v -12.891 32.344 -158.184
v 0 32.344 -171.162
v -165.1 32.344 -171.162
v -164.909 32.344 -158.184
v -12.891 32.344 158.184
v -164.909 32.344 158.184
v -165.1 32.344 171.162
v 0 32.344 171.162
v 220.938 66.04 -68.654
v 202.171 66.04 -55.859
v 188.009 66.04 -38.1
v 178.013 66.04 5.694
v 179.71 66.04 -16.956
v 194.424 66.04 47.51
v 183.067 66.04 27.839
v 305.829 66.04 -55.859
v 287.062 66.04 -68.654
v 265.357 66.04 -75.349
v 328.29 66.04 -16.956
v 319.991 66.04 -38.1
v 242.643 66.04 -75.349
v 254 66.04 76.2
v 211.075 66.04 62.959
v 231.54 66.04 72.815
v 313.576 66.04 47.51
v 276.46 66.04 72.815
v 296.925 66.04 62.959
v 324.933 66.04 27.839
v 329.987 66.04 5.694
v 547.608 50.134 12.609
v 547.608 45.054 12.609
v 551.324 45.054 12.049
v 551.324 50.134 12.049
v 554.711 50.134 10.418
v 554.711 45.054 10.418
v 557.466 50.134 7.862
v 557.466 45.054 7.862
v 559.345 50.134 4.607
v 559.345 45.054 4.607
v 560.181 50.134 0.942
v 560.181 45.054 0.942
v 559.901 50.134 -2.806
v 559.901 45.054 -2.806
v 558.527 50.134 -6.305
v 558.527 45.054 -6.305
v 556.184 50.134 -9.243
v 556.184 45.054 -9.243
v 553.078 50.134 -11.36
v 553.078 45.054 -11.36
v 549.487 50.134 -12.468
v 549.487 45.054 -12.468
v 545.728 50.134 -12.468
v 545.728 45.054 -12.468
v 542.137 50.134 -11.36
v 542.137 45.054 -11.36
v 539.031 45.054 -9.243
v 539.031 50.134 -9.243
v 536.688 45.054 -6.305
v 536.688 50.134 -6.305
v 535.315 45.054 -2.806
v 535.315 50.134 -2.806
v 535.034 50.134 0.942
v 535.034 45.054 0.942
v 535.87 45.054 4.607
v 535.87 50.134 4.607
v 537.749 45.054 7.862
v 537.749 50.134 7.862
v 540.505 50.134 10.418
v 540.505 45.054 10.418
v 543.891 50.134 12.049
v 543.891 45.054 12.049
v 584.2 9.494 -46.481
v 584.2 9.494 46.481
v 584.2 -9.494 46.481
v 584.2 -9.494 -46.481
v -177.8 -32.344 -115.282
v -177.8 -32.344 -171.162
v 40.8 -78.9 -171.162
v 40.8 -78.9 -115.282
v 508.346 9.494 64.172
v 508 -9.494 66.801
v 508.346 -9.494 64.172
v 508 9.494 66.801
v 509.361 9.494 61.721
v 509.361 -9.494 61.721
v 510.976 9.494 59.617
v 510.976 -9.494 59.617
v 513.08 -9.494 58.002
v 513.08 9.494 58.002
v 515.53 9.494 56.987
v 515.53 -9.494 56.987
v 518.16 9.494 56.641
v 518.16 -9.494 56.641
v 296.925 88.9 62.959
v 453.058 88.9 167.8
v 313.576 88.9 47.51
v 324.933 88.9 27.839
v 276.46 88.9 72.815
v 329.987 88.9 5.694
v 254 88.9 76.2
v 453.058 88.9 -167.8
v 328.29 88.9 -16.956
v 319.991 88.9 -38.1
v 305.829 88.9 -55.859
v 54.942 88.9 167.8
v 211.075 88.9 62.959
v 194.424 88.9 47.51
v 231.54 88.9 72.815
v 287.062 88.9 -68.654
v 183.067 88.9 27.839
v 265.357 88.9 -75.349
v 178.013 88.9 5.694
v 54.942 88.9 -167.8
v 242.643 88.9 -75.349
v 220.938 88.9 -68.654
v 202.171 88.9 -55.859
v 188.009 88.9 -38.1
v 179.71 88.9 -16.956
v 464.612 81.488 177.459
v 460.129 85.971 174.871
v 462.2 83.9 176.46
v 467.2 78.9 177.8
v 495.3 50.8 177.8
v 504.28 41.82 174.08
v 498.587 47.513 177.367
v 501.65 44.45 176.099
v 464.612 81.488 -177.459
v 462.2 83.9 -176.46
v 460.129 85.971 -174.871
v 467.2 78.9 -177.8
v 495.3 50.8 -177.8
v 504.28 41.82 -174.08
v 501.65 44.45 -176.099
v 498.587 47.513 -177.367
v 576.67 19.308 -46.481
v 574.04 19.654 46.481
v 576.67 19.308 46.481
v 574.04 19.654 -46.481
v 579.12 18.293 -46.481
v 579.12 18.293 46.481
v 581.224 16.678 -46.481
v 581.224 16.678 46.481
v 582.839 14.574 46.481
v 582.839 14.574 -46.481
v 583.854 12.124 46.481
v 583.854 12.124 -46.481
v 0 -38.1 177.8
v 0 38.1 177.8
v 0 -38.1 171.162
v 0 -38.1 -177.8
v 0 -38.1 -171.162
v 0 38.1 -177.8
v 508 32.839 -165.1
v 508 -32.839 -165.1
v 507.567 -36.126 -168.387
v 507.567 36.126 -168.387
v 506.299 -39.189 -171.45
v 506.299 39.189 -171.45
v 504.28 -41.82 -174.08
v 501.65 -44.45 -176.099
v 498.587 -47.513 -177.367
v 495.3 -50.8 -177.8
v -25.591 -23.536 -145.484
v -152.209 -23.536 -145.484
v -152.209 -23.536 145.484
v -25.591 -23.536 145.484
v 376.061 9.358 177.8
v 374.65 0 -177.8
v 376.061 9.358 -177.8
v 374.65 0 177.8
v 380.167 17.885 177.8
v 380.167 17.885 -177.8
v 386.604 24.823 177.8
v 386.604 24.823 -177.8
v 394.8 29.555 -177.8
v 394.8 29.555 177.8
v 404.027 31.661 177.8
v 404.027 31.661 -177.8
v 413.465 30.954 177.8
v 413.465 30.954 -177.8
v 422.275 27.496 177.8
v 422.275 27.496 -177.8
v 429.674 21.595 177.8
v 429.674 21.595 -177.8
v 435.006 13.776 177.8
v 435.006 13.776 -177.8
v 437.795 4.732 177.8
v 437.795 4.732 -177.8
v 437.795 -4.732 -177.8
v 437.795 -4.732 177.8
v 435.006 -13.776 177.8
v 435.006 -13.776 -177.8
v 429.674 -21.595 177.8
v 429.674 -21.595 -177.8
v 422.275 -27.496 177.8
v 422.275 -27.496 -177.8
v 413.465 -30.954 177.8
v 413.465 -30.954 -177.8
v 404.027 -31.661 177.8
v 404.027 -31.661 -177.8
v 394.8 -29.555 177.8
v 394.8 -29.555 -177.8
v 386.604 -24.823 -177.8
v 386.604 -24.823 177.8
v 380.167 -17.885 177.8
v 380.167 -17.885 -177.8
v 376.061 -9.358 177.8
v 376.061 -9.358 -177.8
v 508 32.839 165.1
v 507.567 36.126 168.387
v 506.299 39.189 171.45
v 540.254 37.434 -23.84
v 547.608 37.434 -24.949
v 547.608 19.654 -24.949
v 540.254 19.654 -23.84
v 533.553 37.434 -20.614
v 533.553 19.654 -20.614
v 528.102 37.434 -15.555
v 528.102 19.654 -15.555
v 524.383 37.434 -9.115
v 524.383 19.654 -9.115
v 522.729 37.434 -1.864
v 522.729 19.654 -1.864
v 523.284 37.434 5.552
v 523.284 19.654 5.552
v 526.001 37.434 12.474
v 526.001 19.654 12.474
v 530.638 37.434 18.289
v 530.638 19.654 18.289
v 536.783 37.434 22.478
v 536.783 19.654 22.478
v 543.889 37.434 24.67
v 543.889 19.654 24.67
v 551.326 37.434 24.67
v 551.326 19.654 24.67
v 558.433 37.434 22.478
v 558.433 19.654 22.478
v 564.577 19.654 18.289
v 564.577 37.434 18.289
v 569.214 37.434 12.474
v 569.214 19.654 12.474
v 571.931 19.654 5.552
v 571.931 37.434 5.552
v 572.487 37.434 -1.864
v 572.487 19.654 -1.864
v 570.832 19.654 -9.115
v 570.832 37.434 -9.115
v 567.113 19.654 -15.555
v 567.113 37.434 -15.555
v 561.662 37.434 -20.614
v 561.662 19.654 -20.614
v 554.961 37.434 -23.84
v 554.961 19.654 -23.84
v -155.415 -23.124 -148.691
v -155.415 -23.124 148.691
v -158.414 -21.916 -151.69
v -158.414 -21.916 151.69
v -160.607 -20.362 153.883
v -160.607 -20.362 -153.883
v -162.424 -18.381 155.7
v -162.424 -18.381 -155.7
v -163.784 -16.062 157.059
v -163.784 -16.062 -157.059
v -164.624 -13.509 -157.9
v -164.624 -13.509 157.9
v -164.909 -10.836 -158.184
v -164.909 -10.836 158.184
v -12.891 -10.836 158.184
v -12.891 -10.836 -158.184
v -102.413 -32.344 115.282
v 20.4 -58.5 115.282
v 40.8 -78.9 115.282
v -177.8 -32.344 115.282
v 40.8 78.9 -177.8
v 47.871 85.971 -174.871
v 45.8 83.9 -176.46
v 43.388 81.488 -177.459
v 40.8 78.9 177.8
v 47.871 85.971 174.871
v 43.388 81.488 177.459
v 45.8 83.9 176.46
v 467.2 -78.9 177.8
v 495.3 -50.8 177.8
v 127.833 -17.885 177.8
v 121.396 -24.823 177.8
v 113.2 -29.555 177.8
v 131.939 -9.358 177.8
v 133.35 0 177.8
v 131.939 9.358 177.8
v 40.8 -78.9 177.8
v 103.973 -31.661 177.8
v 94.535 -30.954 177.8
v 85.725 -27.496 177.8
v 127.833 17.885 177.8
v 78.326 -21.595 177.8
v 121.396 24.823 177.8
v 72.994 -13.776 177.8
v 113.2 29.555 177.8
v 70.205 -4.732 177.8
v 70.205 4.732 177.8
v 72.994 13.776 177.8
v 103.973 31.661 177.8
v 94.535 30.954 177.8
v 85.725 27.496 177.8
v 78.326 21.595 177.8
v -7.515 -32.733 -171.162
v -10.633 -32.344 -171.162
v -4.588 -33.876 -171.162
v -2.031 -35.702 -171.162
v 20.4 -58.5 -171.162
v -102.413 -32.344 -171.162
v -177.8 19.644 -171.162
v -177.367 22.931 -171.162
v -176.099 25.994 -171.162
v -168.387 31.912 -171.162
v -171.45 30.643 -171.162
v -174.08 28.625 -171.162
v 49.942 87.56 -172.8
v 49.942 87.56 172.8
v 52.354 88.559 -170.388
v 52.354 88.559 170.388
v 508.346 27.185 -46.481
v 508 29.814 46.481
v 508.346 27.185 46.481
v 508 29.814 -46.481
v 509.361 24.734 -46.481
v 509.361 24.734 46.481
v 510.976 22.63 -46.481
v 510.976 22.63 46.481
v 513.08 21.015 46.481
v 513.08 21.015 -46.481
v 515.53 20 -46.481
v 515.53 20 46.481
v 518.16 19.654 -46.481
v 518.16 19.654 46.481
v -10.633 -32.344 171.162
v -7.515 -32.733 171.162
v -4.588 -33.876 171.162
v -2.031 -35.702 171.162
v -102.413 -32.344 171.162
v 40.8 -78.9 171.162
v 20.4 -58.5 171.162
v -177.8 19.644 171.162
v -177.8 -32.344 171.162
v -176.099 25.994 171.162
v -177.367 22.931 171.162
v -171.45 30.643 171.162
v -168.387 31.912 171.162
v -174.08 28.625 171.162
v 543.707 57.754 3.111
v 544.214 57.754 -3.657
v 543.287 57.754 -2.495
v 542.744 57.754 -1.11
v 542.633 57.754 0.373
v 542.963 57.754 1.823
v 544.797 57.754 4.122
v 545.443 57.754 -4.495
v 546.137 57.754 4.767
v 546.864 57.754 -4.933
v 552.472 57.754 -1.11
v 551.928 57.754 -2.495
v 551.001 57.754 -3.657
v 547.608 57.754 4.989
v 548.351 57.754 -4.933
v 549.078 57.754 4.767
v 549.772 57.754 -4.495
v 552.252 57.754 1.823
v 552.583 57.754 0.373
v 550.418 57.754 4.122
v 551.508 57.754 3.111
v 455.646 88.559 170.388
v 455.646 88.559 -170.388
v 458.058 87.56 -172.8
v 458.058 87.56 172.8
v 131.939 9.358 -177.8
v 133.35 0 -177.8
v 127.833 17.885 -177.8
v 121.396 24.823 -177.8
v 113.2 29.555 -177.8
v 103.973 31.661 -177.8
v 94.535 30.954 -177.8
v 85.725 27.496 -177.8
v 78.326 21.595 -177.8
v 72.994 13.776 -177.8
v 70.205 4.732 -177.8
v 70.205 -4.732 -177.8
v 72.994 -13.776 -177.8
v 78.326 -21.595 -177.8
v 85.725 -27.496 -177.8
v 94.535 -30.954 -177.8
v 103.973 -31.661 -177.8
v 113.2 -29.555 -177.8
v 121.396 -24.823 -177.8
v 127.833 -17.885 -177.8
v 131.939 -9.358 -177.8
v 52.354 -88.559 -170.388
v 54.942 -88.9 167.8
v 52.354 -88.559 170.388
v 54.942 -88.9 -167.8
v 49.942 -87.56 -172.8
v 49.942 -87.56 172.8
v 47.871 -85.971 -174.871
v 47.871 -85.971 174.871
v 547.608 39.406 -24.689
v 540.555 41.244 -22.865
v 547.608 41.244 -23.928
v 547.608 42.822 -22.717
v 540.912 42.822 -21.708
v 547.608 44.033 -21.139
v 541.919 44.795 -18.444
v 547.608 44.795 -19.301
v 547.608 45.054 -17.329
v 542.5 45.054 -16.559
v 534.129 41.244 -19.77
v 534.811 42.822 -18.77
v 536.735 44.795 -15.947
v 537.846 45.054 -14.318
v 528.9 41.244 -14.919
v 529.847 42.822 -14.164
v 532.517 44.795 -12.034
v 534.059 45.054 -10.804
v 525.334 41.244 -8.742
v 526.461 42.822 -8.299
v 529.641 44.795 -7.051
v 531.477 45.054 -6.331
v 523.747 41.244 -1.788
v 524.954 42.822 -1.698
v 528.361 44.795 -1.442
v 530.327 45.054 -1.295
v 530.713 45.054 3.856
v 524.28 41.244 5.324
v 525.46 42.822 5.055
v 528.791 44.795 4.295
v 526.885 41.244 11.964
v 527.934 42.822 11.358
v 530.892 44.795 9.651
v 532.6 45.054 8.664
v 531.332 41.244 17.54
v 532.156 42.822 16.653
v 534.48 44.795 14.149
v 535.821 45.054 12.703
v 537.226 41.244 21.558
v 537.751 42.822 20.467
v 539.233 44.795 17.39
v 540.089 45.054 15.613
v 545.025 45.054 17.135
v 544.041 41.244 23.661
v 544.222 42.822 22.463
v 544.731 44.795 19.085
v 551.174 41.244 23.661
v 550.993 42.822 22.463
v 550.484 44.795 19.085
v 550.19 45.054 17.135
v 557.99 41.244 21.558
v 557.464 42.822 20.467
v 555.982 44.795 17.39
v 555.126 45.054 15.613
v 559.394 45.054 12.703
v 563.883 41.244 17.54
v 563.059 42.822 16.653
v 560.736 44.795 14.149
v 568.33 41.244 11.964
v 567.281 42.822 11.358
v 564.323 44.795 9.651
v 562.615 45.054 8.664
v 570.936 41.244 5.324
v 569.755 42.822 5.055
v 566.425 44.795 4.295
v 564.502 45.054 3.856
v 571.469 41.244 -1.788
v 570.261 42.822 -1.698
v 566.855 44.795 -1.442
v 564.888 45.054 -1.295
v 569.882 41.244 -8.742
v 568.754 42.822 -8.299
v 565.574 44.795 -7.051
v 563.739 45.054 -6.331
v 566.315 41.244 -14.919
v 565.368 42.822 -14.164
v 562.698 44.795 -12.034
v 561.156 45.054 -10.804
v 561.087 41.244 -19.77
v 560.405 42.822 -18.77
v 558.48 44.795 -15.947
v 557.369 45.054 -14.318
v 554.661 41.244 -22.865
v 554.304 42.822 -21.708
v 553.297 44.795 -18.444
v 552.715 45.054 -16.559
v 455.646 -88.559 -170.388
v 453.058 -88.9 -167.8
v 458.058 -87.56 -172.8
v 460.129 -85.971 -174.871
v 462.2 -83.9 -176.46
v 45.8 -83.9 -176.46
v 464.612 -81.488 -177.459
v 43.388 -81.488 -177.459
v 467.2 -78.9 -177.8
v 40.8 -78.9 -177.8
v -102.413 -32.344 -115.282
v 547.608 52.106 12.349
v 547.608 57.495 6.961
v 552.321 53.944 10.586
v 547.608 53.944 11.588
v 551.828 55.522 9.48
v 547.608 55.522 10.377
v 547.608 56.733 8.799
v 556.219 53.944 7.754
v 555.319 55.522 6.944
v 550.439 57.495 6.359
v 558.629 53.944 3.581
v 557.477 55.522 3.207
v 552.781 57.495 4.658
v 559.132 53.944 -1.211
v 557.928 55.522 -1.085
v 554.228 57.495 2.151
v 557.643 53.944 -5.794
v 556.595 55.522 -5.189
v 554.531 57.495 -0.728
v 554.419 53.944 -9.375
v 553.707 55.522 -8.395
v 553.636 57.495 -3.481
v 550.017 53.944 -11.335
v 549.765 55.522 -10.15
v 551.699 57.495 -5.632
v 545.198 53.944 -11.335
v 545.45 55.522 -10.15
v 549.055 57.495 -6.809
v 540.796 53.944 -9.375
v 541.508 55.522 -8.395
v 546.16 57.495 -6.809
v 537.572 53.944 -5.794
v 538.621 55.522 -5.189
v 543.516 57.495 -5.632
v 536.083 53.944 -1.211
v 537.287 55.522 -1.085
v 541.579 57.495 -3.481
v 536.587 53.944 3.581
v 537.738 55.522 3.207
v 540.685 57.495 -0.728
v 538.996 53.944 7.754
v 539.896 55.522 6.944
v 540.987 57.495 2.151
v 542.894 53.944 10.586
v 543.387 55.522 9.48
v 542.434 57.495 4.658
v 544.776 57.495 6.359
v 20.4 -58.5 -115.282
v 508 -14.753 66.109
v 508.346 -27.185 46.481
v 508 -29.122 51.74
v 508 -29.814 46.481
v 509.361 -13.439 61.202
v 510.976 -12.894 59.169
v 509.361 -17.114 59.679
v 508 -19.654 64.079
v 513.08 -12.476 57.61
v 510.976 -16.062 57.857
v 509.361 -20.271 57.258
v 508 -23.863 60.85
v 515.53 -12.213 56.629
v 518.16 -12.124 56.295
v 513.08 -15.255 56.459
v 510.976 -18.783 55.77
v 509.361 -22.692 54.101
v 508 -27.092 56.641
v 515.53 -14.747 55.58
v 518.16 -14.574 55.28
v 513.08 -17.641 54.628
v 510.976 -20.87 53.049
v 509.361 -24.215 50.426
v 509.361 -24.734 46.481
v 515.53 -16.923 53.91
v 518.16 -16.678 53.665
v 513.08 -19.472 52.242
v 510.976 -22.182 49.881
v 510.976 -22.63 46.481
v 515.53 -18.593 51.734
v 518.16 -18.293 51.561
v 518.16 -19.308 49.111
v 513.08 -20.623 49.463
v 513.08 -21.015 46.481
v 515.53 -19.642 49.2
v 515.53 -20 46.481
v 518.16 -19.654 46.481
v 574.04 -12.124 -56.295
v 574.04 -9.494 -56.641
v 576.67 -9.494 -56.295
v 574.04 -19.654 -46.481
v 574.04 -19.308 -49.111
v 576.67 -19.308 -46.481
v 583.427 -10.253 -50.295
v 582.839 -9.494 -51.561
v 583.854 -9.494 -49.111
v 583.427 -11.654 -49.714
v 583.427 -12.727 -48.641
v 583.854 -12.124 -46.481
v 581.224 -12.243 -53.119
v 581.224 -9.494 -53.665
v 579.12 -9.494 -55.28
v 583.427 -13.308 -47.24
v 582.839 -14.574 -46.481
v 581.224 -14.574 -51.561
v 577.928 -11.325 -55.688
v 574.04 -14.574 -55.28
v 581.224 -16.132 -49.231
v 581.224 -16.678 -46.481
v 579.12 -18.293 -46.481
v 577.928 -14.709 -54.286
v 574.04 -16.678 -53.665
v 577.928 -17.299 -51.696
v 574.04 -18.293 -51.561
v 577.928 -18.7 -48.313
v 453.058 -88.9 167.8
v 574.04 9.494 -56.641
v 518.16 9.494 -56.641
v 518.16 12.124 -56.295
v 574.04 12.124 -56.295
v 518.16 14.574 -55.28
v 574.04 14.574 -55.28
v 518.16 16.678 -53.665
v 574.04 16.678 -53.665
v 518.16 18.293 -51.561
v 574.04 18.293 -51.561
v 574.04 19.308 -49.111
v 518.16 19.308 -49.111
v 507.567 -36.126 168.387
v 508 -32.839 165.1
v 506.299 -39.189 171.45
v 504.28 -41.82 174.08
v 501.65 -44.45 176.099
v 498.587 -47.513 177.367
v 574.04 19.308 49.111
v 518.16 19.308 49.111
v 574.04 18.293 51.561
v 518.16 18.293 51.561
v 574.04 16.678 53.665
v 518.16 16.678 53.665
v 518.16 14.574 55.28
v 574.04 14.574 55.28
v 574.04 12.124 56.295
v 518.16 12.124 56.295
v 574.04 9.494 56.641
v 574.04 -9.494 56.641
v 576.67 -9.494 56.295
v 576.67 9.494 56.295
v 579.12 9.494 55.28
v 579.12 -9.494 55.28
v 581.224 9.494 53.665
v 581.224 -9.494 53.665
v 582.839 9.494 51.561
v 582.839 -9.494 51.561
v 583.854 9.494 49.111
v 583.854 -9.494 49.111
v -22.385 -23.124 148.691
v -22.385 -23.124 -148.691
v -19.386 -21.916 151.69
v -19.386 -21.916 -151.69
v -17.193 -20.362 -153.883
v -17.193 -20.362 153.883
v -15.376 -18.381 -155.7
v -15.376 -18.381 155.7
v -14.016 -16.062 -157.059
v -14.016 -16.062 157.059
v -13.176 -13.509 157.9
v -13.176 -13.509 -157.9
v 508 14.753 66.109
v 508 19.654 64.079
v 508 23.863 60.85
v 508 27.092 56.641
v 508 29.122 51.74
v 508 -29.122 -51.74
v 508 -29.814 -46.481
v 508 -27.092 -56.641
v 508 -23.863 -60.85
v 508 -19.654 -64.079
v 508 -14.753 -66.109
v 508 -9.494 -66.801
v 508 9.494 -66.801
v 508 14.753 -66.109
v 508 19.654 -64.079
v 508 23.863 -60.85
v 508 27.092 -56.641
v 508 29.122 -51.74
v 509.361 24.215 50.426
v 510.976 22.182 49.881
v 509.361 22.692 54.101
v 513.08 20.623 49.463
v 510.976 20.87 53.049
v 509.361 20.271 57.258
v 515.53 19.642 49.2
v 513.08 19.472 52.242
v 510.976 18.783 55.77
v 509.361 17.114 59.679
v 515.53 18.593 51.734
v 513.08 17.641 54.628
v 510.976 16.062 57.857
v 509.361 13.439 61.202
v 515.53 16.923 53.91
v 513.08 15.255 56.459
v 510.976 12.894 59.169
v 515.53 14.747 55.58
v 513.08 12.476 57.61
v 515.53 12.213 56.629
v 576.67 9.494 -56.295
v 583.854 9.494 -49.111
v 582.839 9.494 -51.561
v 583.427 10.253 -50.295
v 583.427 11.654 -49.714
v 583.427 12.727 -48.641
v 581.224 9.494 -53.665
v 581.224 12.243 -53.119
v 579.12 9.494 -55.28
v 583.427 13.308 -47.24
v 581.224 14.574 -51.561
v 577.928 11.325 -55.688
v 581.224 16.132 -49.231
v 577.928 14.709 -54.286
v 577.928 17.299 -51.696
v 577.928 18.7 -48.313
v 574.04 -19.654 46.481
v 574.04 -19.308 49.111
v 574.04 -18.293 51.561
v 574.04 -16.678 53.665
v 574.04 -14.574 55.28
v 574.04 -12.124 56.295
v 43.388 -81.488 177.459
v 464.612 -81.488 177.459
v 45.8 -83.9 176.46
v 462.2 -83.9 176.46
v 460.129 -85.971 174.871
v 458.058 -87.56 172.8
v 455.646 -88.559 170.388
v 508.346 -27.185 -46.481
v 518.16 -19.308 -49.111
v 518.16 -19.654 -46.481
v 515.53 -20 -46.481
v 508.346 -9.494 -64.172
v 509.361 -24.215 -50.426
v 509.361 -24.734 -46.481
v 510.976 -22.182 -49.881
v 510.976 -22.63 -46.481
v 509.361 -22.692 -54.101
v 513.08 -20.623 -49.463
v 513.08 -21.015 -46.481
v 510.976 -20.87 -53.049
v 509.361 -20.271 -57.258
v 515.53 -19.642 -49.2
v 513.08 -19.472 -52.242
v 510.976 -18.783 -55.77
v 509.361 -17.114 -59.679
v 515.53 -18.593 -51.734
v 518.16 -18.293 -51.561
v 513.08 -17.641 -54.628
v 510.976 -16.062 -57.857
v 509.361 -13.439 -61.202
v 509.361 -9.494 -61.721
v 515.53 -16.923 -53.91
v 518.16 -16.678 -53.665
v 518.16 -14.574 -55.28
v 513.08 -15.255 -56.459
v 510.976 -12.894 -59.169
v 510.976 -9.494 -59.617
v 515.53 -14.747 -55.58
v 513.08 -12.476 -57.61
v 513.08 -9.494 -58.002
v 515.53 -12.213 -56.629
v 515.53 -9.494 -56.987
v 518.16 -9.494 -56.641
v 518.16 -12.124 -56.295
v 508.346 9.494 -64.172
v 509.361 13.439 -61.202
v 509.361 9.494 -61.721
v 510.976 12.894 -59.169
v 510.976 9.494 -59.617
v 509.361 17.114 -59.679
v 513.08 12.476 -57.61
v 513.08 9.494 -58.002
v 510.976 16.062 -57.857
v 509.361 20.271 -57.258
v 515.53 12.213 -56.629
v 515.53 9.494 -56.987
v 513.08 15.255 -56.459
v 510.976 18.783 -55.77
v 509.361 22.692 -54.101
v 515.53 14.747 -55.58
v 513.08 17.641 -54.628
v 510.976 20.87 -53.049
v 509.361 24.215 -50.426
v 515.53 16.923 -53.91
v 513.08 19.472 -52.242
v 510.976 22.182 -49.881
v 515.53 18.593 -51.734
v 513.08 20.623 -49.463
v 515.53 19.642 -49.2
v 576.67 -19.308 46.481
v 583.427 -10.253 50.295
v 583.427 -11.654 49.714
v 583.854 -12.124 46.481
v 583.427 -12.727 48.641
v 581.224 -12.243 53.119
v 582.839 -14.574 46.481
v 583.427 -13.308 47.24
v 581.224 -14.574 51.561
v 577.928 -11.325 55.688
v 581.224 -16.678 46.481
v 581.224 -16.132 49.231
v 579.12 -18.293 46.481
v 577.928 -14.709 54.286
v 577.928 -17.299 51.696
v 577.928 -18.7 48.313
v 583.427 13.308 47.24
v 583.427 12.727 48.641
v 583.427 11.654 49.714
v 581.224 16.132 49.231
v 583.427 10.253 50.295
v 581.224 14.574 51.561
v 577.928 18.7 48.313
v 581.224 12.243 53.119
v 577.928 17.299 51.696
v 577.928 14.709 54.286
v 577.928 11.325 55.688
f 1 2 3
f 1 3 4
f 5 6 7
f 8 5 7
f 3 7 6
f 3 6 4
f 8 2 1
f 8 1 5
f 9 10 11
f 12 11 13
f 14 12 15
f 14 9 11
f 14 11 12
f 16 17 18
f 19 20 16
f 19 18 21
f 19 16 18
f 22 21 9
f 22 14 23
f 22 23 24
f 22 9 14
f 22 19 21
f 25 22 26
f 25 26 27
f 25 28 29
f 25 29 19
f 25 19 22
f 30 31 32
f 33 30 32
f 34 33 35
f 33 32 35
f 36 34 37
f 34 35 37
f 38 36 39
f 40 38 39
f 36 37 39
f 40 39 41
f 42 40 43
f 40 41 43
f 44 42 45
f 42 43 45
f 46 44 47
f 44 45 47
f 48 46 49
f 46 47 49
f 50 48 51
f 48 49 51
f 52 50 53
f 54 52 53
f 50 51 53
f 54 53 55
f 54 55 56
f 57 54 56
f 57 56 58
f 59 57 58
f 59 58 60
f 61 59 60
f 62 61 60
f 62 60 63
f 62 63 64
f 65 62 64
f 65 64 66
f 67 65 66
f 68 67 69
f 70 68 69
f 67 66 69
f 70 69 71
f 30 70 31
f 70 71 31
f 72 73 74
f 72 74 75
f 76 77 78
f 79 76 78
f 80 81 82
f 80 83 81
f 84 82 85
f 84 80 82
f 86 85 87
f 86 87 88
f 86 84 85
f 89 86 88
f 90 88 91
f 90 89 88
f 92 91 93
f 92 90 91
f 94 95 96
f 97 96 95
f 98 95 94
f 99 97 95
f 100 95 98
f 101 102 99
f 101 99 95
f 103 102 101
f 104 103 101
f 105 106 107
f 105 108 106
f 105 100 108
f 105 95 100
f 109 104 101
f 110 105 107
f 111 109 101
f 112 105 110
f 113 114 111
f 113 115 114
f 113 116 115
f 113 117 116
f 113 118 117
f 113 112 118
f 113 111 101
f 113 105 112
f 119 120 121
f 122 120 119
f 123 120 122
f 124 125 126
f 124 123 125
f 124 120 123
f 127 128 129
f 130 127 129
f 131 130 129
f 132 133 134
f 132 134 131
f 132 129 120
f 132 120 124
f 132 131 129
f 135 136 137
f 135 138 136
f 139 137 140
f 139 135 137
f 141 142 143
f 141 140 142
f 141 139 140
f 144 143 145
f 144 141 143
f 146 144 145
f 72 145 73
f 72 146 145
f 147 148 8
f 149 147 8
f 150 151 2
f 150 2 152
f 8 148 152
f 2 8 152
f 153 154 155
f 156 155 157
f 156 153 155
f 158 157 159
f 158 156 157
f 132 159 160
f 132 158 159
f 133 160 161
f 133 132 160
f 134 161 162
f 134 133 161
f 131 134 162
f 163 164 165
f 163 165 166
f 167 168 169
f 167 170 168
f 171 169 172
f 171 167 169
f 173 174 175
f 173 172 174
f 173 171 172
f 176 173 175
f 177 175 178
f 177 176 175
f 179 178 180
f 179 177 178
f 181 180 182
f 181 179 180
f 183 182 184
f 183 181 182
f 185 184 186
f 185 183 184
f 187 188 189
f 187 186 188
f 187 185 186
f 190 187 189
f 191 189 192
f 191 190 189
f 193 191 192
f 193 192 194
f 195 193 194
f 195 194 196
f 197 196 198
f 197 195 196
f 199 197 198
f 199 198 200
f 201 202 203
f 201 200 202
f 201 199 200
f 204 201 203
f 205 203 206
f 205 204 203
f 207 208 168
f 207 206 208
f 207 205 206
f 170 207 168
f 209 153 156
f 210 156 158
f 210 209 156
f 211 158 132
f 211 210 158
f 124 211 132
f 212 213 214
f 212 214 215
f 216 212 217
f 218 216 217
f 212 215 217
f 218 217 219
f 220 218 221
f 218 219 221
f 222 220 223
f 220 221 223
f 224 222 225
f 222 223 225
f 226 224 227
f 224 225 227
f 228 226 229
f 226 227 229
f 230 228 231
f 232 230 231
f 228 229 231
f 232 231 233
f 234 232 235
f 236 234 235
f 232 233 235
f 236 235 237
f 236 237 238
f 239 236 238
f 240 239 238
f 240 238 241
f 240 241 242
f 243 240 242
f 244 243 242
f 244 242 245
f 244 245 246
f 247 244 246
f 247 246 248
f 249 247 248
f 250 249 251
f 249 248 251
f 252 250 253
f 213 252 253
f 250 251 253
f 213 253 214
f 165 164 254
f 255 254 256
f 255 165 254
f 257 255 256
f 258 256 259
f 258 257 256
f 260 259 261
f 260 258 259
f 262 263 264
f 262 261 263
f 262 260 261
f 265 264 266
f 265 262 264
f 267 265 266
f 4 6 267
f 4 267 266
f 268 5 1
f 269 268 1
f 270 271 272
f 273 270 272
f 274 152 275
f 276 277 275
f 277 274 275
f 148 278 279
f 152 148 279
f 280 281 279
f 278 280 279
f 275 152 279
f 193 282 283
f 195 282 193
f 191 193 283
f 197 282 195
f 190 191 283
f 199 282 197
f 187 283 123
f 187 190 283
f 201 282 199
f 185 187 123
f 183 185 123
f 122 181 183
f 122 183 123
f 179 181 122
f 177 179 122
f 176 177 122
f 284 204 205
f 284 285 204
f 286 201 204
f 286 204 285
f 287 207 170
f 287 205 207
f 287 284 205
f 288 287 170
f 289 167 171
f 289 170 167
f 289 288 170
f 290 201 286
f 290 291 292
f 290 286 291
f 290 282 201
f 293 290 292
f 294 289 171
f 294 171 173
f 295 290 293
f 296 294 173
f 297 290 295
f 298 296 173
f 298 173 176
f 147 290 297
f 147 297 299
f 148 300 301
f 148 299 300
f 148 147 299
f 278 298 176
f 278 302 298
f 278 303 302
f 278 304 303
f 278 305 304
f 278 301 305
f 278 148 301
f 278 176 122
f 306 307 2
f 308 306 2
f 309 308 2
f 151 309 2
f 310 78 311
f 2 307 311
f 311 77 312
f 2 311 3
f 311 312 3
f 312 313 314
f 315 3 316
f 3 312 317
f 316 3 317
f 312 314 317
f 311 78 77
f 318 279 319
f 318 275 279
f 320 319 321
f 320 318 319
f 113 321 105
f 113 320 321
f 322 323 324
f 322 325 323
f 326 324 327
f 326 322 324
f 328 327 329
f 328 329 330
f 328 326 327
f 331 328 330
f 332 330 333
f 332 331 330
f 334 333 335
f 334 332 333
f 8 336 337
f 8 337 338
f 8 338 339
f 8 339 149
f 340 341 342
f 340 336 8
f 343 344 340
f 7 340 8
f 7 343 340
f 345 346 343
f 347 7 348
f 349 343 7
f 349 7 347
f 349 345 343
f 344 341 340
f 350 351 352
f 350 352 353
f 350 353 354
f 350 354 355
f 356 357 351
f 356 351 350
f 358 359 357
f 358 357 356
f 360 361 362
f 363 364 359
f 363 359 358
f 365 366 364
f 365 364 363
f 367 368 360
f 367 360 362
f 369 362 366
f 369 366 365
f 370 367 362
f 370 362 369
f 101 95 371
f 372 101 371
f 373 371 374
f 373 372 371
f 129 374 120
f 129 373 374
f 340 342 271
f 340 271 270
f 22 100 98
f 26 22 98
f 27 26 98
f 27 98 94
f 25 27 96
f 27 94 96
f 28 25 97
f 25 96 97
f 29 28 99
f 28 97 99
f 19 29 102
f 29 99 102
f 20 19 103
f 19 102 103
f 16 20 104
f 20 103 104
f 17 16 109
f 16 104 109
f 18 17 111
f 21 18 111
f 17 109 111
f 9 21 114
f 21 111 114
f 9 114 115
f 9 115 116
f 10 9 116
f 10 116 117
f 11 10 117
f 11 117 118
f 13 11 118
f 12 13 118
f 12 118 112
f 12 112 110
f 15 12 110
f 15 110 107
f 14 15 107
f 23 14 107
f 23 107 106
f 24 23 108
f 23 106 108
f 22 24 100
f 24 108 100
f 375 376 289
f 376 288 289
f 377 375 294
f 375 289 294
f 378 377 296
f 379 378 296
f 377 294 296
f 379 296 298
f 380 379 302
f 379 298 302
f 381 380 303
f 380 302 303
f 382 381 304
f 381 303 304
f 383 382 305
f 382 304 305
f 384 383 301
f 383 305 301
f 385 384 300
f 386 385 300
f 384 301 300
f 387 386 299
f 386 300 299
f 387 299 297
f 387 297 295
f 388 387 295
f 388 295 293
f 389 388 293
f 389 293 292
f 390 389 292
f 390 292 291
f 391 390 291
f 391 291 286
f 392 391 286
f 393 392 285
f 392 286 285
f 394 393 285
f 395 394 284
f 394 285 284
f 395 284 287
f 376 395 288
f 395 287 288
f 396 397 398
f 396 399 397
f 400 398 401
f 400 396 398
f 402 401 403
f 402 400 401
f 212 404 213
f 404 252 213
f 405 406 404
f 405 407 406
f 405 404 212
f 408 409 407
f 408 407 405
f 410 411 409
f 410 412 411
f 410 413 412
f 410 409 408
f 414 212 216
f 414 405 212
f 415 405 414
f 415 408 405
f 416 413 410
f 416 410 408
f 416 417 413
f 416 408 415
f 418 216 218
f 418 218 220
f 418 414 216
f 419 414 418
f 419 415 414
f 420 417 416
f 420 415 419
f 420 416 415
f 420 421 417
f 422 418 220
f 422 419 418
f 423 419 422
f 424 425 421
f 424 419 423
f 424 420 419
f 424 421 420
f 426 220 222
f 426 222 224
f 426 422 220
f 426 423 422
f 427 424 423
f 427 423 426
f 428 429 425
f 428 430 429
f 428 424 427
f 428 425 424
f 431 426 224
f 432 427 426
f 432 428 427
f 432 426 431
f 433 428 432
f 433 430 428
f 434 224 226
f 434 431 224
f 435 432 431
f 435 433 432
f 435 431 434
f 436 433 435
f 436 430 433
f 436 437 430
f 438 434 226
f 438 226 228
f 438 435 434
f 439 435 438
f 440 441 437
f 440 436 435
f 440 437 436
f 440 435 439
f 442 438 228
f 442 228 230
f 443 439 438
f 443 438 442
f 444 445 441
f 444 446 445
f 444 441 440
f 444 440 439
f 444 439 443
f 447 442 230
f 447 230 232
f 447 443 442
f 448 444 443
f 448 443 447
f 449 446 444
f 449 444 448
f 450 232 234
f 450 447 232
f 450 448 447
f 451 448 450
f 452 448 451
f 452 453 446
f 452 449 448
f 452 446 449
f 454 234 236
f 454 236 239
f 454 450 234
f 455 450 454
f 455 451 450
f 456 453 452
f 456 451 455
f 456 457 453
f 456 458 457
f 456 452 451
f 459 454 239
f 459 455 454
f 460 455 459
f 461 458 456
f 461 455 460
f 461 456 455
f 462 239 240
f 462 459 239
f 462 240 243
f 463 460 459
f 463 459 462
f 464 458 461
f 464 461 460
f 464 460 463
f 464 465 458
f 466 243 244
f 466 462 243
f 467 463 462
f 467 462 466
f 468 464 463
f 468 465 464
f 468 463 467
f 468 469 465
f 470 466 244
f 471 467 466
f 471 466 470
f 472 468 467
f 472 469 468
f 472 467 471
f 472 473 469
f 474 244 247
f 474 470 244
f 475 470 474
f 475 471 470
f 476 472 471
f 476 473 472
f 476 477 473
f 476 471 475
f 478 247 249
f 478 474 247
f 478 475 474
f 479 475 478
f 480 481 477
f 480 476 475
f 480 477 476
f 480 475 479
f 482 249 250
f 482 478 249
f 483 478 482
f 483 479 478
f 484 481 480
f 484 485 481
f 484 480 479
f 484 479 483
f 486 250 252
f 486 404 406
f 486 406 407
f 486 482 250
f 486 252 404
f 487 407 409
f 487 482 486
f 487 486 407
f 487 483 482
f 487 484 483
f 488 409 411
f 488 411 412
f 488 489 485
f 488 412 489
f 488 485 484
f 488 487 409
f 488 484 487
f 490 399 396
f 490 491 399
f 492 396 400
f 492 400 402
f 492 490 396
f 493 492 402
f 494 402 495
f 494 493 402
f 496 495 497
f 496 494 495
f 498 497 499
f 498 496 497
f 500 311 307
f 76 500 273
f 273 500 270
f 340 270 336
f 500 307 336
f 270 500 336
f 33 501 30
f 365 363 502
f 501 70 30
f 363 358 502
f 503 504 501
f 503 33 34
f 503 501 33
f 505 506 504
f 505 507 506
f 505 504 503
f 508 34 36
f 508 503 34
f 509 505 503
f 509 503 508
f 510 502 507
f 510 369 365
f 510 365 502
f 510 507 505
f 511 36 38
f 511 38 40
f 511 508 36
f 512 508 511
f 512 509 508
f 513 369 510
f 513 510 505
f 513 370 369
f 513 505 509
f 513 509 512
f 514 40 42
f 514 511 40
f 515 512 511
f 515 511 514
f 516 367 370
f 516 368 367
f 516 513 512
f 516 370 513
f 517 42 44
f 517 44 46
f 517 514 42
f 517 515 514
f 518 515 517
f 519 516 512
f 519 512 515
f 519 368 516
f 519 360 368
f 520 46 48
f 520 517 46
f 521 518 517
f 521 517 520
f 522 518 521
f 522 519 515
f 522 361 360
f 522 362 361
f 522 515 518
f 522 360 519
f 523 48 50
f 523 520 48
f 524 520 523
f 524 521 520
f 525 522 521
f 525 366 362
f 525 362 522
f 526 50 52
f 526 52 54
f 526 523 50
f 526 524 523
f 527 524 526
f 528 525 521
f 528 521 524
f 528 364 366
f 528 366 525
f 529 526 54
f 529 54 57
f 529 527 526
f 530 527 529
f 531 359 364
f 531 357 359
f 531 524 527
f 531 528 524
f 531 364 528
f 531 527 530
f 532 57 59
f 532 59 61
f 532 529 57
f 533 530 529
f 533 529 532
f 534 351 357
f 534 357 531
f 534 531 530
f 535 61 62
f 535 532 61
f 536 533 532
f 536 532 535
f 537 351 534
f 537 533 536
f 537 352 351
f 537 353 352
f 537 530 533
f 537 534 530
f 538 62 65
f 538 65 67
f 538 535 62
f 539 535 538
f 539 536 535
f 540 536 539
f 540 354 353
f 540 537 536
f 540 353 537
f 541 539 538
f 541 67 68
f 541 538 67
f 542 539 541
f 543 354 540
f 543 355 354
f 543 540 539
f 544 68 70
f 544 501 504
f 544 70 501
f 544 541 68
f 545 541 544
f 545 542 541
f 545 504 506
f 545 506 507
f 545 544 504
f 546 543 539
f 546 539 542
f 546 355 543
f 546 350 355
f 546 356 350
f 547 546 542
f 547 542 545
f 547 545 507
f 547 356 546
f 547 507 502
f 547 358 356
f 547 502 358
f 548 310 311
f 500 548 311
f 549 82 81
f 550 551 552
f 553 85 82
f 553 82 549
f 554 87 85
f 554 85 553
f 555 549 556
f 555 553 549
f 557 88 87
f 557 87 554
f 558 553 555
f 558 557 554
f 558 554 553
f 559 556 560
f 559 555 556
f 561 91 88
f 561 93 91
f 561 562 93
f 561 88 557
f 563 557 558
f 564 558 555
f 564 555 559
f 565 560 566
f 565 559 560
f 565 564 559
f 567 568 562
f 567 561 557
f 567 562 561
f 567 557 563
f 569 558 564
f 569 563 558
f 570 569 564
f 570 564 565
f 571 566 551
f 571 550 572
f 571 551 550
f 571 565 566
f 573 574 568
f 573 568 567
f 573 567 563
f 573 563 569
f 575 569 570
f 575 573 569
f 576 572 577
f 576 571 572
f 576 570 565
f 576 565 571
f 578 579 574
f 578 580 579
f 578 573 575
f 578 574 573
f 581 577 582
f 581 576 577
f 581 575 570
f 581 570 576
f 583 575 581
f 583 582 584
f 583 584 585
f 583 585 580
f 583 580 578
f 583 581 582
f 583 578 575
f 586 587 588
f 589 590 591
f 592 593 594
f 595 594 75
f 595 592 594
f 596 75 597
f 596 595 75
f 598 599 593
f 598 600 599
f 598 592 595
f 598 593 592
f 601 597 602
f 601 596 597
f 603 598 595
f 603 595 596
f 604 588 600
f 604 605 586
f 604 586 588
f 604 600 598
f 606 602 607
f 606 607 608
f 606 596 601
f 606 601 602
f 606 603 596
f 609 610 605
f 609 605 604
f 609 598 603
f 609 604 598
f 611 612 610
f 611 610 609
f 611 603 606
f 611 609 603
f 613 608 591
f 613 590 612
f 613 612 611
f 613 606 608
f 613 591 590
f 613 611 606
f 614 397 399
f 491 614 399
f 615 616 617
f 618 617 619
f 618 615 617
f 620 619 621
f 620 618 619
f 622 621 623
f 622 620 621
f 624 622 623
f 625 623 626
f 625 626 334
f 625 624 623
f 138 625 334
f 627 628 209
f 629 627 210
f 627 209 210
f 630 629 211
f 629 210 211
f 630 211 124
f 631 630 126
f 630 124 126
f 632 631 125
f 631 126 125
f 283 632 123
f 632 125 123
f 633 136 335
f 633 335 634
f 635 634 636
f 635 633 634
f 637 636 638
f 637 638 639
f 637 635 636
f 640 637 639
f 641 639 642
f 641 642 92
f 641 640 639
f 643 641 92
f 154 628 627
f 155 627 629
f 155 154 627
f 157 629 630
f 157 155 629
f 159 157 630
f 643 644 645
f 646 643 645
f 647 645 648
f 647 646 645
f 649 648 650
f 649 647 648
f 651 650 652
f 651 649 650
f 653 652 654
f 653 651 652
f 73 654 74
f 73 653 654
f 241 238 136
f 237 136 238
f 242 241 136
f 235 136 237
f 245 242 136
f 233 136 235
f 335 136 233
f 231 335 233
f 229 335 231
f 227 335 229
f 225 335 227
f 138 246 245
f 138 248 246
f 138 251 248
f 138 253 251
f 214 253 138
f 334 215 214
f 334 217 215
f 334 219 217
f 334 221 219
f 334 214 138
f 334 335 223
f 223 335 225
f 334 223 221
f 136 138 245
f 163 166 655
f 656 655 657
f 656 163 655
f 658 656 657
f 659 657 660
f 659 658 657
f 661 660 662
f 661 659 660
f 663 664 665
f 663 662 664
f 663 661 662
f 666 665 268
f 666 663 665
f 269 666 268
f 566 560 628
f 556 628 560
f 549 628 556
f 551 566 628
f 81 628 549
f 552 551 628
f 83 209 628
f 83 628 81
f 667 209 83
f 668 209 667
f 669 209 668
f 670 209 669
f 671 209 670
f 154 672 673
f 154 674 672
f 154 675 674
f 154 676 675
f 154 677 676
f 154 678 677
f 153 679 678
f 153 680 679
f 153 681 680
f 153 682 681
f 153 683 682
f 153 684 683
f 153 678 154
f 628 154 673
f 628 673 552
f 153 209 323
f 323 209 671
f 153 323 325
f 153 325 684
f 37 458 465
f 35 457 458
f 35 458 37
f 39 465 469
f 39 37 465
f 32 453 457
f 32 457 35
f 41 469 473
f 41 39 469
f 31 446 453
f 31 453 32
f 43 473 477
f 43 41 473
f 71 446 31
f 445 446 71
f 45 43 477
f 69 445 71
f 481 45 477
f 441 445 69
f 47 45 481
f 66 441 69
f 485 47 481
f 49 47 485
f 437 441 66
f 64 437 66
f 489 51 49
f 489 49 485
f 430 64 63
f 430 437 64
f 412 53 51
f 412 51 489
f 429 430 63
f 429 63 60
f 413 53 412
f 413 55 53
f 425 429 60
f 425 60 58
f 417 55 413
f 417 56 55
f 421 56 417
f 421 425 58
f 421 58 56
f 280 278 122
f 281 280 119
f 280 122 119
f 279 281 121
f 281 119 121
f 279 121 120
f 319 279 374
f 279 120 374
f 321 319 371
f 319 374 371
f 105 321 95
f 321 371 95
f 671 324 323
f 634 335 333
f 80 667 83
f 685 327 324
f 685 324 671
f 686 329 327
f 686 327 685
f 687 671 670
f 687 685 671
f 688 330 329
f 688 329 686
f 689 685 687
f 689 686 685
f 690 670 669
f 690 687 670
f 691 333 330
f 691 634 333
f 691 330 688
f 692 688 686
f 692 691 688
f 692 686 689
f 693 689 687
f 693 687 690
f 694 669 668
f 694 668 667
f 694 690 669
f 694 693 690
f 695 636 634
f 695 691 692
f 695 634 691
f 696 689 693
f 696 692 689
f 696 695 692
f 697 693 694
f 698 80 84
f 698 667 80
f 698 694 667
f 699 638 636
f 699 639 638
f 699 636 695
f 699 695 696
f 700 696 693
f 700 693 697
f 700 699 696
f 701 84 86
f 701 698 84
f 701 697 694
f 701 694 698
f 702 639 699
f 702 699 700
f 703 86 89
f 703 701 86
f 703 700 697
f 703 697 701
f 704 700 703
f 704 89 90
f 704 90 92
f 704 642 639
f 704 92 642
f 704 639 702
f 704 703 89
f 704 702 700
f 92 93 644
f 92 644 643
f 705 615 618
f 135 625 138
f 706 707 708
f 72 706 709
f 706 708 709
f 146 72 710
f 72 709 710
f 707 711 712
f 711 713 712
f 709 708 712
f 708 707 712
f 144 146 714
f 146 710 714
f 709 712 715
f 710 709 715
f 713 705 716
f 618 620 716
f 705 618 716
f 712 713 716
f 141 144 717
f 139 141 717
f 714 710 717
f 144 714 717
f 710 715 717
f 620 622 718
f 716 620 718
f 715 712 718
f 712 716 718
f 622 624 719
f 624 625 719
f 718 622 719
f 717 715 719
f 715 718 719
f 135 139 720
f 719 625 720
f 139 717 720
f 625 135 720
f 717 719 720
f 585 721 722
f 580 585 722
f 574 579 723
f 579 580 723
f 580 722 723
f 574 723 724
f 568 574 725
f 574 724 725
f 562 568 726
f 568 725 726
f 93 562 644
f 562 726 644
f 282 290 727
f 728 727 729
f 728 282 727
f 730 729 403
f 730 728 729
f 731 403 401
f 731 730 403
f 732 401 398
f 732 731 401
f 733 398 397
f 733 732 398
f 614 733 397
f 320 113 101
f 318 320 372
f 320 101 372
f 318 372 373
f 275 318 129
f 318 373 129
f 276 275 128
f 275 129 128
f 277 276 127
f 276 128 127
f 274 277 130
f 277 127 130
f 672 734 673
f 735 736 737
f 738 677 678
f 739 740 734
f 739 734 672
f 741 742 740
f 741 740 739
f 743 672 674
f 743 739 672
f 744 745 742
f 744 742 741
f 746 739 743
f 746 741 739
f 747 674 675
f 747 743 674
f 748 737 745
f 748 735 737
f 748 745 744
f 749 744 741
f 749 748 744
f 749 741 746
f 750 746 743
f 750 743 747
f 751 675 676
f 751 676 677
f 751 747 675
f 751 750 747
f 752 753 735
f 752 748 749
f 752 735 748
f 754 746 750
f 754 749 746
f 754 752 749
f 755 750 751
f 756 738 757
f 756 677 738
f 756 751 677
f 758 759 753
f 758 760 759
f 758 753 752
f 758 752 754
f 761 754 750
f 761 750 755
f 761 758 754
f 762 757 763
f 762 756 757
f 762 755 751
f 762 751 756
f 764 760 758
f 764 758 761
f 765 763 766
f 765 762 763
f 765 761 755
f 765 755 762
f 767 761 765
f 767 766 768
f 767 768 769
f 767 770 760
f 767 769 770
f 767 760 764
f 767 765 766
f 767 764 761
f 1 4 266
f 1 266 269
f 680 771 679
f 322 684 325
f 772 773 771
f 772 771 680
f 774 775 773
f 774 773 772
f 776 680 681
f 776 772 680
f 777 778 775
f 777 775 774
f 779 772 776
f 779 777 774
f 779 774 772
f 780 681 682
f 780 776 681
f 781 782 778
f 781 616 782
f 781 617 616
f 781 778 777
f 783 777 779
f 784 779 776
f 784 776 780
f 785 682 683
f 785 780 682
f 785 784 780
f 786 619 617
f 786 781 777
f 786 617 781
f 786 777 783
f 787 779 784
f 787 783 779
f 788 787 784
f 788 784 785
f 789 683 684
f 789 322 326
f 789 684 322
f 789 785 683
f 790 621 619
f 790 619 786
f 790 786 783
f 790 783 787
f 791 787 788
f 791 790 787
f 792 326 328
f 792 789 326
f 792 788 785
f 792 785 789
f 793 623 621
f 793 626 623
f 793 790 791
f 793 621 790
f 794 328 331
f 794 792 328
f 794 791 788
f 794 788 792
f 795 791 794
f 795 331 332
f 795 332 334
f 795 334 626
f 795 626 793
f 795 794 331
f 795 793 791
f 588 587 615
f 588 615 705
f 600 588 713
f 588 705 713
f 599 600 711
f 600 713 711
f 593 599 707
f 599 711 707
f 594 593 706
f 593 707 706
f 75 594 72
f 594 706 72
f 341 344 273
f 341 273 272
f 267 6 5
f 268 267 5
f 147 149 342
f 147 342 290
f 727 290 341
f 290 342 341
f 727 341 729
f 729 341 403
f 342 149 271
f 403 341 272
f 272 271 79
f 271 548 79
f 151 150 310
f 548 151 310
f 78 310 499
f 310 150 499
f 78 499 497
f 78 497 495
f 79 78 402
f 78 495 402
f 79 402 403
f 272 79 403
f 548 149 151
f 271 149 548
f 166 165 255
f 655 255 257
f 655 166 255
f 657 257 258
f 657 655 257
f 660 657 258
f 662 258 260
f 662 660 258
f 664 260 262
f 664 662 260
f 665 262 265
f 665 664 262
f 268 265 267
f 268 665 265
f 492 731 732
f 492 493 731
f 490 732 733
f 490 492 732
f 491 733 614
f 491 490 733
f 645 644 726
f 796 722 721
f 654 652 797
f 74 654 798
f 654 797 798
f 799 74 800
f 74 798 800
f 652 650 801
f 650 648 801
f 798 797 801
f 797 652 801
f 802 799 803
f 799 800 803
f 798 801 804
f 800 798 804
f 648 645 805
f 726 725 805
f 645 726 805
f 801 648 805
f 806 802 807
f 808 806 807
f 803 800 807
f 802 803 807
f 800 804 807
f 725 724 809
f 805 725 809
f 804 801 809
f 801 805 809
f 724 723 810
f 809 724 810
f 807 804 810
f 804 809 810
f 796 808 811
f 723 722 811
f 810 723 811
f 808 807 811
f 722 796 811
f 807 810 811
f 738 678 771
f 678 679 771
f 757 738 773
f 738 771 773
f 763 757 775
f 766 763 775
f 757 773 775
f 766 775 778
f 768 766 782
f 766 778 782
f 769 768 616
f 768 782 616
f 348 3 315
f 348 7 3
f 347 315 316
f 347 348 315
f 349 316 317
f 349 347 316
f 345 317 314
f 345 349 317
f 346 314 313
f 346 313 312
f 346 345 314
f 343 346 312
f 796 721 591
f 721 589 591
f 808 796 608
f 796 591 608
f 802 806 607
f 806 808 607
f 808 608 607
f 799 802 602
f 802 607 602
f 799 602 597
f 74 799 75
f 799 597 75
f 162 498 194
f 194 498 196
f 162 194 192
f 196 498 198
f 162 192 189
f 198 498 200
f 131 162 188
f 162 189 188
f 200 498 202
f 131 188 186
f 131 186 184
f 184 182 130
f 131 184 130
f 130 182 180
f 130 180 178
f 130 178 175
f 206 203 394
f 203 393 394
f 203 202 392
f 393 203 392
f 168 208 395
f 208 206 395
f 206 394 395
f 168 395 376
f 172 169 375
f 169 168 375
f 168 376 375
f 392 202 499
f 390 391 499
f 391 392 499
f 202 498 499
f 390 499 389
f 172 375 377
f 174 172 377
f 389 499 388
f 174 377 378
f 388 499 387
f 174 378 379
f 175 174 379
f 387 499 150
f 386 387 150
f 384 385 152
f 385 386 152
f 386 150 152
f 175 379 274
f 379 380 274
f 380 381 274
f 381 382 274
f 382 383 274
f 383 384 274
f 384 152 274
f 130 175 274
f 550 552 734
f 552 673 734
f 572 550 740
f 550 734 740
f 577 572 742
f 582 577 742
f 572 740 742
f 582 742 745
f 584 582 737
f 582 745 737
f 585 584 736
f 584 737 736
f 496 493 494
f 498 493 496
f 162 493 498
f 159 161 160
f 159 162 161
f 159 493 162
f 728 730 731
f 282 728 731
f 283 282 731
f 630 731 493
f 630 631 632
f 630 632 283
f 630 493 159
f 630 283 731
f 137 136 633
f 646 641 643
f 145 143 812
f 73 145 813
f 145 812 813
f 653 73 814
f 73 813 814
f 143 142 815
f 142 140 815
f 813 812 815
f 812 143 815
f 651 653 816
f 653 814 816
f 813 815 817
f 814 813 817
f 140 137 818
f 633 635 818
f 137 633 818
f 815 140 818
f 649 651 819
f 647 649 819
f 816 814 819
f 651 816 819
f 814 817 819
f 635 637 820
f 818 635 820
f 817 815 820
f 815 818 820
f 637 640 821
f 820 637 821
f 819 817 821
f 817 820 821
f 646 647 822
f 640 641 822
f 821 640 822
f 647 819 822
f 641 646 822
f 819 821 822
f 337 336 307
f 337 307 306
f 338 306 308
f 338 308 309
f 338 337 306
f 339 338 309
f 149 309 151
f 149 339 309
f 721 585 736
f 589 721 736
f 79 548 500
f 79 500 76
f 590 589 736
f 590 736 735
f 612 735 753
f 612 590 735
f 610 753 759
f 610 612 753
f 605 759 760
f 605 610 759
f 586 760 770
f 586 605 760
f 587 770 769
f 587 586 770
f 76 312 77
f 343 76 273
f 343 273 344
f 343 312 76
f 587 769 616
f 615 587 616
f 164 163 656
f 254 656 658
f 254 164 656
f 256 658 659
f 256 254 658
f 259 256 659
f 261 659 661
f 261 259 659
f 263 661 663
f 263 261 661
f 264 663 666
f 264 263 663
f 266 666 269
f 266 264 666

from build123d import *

# Parameters (mm, degrees)
SKETCH3_W           = 355.6
SKETCH3_H           = 177.8
BOSS_EXTRUDE1_DEPTH = 508
SKETCH4_R           = 31.75
CUT_EXTRUDE1_DEPTH  = 627.433212721
CHAMFER1_START      = -64
CHAMFER1_OUTLINE_W  = 75
CHAMFER1_OUTLINE_H  = 358
CHAMFER1_DEPTH      = 37.059231637
CHAMFER2_START      = -64
CHAMFER2_OUTLINE_W  = 75
CHAMFER2_OUTLINE_H  = 358
CHAMFER2_DEPTH      = 37.059231637
CHAMFER3_START      = 386.151013206
CHAMFER3_OUTLINE_W  = 75
CHAMFER3_OUTLINE_H  = 358
CHAMFER3_DEPTH      = 36.848986794
CHAMFER4_START      = 386.151013206
CHAMFER4_OUTLINE_W  = 75
CHAMFER4_OUTLINE_H  = 358
CHAMFER4_DEPTH      = 36.848986794
FILLET1_R           = 10
SKETCH5_R           = 76.2
CUT_EXTRUDE2_DEPTH  = 22.86
SKETCH7_W           = 342.323707946
SKETCH7_H           = 64.688657288
BOSS_EXTRUDE3_DEPTH = 177.8
SKETCH8_W           = 152.017430594
SKETCH8_H           = 316.368655432
CUT_EXTRUDE3_DEPTH  = 55.88
BOSS_EXTRUDE5_DEPTH = 55.88
SKETCH11_W          = 113.282529032
SKETCH11_H          = 39.308418544
BOSS_EXTRUDE6_DEPTH = 76.2
FILLET2_R           = 10.16
FILLET3_R           = 12.7
FILLET4_R           = 12.7
FILLET5_R           = 12.7
SKETCH12_R          = 24.948838793
BOSS_EXTRUDE7_DEPTH = 25.4
FILLET6_R           = 7.62
SKETCH13_R          = 12.609032653
BOSS_EXTRUDE8_DEPTH = 12.7
FILLET7_R           = 7.62


with BuildPart() as part:
    # Sketch3 → Boss-Extrude1 (new body)
    with BuildSketch(Plane(origin=(0, 0, 0), x_dir=(0, 0, -1), z_dir=(1, 0, 0))):
        Rectangle(SKETCH3_W, SKETCH3_H)
    extrude(amount=BOSS_EXTRUDE1_DEPTH)

    # Sketch4 → Cut-Extrude1 (cut, symmetric)
    with BuildSketch(Plane.XY.offset(177.8)):
        with Locations((101.6, 0)):
            Circle(SKETCH4_R)
    cut_extrude1 = extrude(amount=CUT_EXTRUDE1_DEPTH, both=True, mode=Mode.SUBTRACT)

    # Mirror1: Cut-Extrude1 across plane
    add(cut_extrude1.mirror(Plane.ZY.offset(-254)), mode=Mode.SUBTRACT)

    # Chamfer1: read off the stored shape, not the designer's step
    # Chamfer1 outline → Chamfer1 (cut)
    with BuildSketch(Plane(origin=(0, 0, 0), x_dir=(0.7071067811865471, 0.707106781186548, 0), z_dir=(0.707106781186548, -0.707106781186547, 0)).offset(CHAMFER1_START)):
        with Locations((62.5, 0)):
            Rectangle(CHAMFER1_OUTLINE_W, CHAMFER1_OUTLINE_H)
    extrude(amount=CHAMFER1_DEPTH, mode=Mode.SUBTRACT)

    # Chamfer2: read off the stored shape, not the designer's step
    # Chamfer2 outline → Chamfer2 (cut)
    with BuildSketch(Plane(origin=(0, 0, 0), x_dir=(0.707106781186548, -0.707106781186547, 0), z_dir=(0.707106781186547, 0.707106781186548, 0)).offset(CHAMFER2_START)):
        with Locations((62.5, 0)):
            Rectangle(CHAMFER2_OUTLINE_W, CHAMFER2_OUTLINE_H)
    extrude(amount=CHAMFER2_DEPTH, mode=Mode.SUBTRACT)

    # Chamfer3: read off the stored shape, not the designer's step
    # Chamfer3 outline → Chamfer3 (cut)
    with BuildSketch(Plane(origin=(0, 0, 0), x_dir=(0.707106781186548, -0.707106781186547, 0), z_dir=(0.707106781186547, 0.707106781186548, 0)).offset(CHAMFER3_START)):
        with Locations((296.5, 0)):
            Rectangle(CHAMFER3_OUTLINE_W, CHAMFER3_OUTLINE_H)
    extrude(amount=CHAMFER3_DEPTH, mode=Mode.SUBTRACT)

    # Chamfer4: read off the stored shape, not the designer's step
    # Chamfer4 outline → Chamfer4 (cut)
    with BuildSketch(Plane(origin=(0, 0, 0), x_dir=(0.707106781186548, 0.707106781186547, 0), z_dir=(0.707106781186547, -0.707106781186548, 0)).offset(CHAMFER4_START)):
        with Locations((296.5, 0)):
            Rectangle(CHAMFER4_OUTLINE_W, CHAMFER4_OUTLINE_H)
    extrude(amount=CHAMFER4_DEPTH, mode=Mode.SUBTRACT)

    # Fillet1
    fillet1_edges = [part.edges().sort_by_distance(p)[0] for p in [
        (50.8, 88.9, 0),
        (50.8, -88.9, 0),
        (254, 88.9, -177.8),
        (254, 88.9, 177.8),
        (457.2, 88.9, 0),
        (254, -88.9, 177.8),
        (254, -88.9, -177.8),
        (457.2, -88.9, 0),
    ]]
    fillet(fillet1_edges, radius=FILLET1_R)

    # Sketch5 → Cut-Extrude2 (cut)
    with BuildSketch(Plane(origin=(0, 88.9, 0), x_dir=(1, 0, 0), z_dir=(0, 1, 0))):
        with Locations(Location((254, 0, 0), (0, 0, 270))):
            Circle(SKETCH5_R)
    extrude(amount=-CUT_EXTRUDE2_DEPTH, mode=Mode.SUBTRACT)

    # Sketch7 → Boss-Extrude3 (add)
    with BuildSketch(Plane.ZY):
        Rectangle(SKETCH7_W, SKETCH7_H)
    extrude(amount=BOSS_EXTRUDE3_DEPTH)

    # Sketch8 → Cut-Extrude3 (cut)
    with BuildSketch(Plane(origin=(0, 32.344328644, 0), x_dir=(1, 0, 0), z_dir=(0, 1, 0))):
        with Locations((-88.9, 0)):
            Rectangle(SKETCH8_W, SKETCH8_H)
    extrude(amount=-CUT_EXTRUDE3_DEPTH, mode=Mode.SUBTRACT)

    # Sketch10 → Boss-Extrude5 (add)
    with BuildSketch(Plane.XY.offset(171.161853973)):
        Polygon((-177.8, -32.344328644), (40.8, -78.9), (20.4, -58.5), (-102.412744224, -32.344328644), align=None)
    boss_extrude5 = extrude(amount=-BOSS_EXTRUDE5_DEPTH)

    # Mirror2: Boss-Extrude5 across plane
    add(boss_extrude5.mirror(Plane.XY))

    # Sketch11 → Boss-Extrude6 (add)
    with BuildSketch(Plane(origin=(508, 0, 0), x_dir=(0, 0, -1), z_dir=(1, 0, 0))):
        Rectangle(SKETCH11_W, SKETCH11_H)
    extrude(amount=BOSS_EXTRUDE6_DEPTH)

    # Fillet2
    fillet2_edges = [part.edges().sort_by_distance(p)[0] for p in [
        (508, 0, -56.641264516),
        (546.1, -19.654209272, -56.641264516),
        (508, 19.654209272, 0),
        (546.1, 19.654209272, -56.641264516),
        (508, 0, 56.641264516),
        (546.1, 19.654209272, 56.641264516),
        (508, -19.654209272, 0),
        (546.1, -19.654209272, 56.641264516),
        (584.2, 0, -56.641264516),
        (584.2, 19.654209272, 0),
        (584.2, 0, 56.641264516),
        (584.2, -19.654209272, 0),
    ]]
    fillet(fillet2_edges, radius=FILLET2_R)

    # Fillet3
    fillet3_edges = [part.edges().sort_by_distance(p)[0] for p in [
        (508, 0, 177.8),
        (508, 38.1, 0),
        (508, 0, -177.8),
        (508, -38.1, 0),
    ]]
    fillet(fillet3_edges, radius=FILLET3_R)

    # Fillet4
    # the kernel refuses this fillet: 12.7 mm, written as the material it adds along each edge
    with BuildSketch(Plane(origin=(0, -32.344328644, 171.161853973), x_dir=(-1.269692375710673e-12, -1.0, 0), z_dir=(0, 0, -1))) as fillet4_piece_1:
        with BuildLine():
            CenterArc((12.7, 10.63326383), FILLET4_R, 180, 56.852413593)
            Line((0, 10.63326383), (-0.254, 10.63326383))
            Line((-0.254, 10.63326383), (-0.254, 0))
            Line((-0.254, 0), (0, -0.254))
            ThreePointArc((0, -0.254), (2.877835678, -0.254), (5.616784783, -0.212665277))
            Line((5.616784783, -0.212665277), (5.755671356, 0))
        make_face()
    extrude(amount=342.323707946)
    with BuildSketch(Plane(origin=(-12.891284703, -23.535671356, -158.184327716), x_dir=(0, 1, 0), z_dir=(0, 0, 1)), Plane(origin=(-164.908715297, -23.535671356, 158.184327716), x_dir=(0, 1, 0), z_dir=(0, 0, -1))) as fillet4_piece_2:
        with BuildLine():
            CenterArc((FILLET4_R, FILLET4_R), FILLET4_R, 180, 90)
            Line((0, FILLET4_R), (-FILLET4_R * 0.02, FILLET4_R))
            Line((-FILLET4_R * 0.02, FILLET4_R), (-FILLET4_R * 0.02, -FILLET4_R * 0.02))
            Line((-FILLET4_R * 0.02, -FILLET4_R * 0.02), (FILLET4_R, -FILLET4_R * 0.02))
            Line((FILLET4_R, -FILLET4_R * 0.02), (FILLET4_R, 0))
        make_face()
    extrude(amount=316.368655432)
    with BuildSketch(Plane(origin=(18.858715297, -23.535671356, 158.184327716), x_dir=(0, 1, 0), z_dir=(-1, 0, 0)), Plane(origin=(-164.908715297, -23.535671356, -158.184327716), x_dir=(0, 1, 0), z_dir=(1, 0, 0))) as fillet4_piece_3:
        with BuildLine():
            CenterArc((FILLET4_R, FILLET4_R), FILLET4_R, 180, 90)
            Line((0, FILLET4_R), (-FILLET4_R * 0.02, FILLET4_R))
            Line((-FILLET4_R * 0.02, FILLET4_R), (-FILLET4_R * 0.02, -FILLET4_R * 0.02))
            Line((-FILLET4_R * 0.02, -FILLET4_R * 0.02), (FILLET4_R, -FILLET4_R * 0.02))
            Line((FILLET4_R, -FILLET4_R * 0.02), (FILLET4_R, 0))
        make_face()
    extrude(amount=183.767430594)
    with BuildSketch(Plane(origin=(-164.908715297, -23.535671356, 189.934327716), x_dir=(0, 1, 0), z_dir=(0, 0, -1))) as fillet4_piece_4a_section:
        with BuildLine():
            CenterArc((FILLET4_R, FILLET4_R), FILLET4_R, 180, 90)
            Line((0, FILLET4_R), (-FILLET4_R * 0.02, FILLET4_R))
            Line((-FILLET4_R * 0.02, FILLET4_R), (-FILLET4_R * 0.02, -FILLET4_R * 0.02))
            Line((-FILLET4_R * 0.02, -FILLET4_R * 0.02), (FILLET4_R, -FILLET4_R * 0.02))
            Line((FILLET4_R, -FILLET4_R * 0.02), (FILLET4_R, 0))
        make_face()
    fillet4_piece_4a = extrude(amount=348.118655432, mode=Mode.PRIVATE)
    fillet4_piece_4a = split(fillet4_piece_4a, bisect_by=Plane(origin=(-164.908715297, -23.535671356, 158.184327716), z_dir=(0, 0, 1)), keep=Keep.TOP, mode=Mode.PRIVATE)
    with BuildSketch(Plane(origin=(-12.891284703, -23.535671356, 158.184327716), x_dir=(0, 1, 0), z_dir=(-1, 0, 0))) as fillet4_piece_4b_section:
        with BuildLine():
            CenterArc((FILLET4_R, FILLET4_R), FILLET4_R, 180, 90)
            Line((0, FILLET4_R), (-FILLET4_R * 0.02, FILLET4_R))
            Line((-FILLET4_R * 0.02, FILLET4_R), (-FILLET4_R * 0.02, -FILLET4_R * 0.02))
            Line((-FILLET4_R * 0.02, -FILLET4_R * 0.02), (FILLET4_R, -FILLET4_R * 0.02))
            Line((FILLET4_R, -FILLET4_R * 0.02), (FILLET4_R, 0))
        make_face()
    fillet4_piece_4b = extrude(amount=183.767430594, mode=Mode.PRIVATE)
    fillet4_piece_4b = split(fillet4_piece_4b, bisect_by=Plane(origin=(-164.908715297, -23.535671356, 158.184327716), z_dir=(-1, 0, 0)), keep=Keep.TOP, mode=Mode.PRIVATE)
    fillet4_piece_4 = fillet4_piece_4a & fillet4_piece_4b
    add(fillet4_piece_4)
    with BuildSketch(Plane(origin=(-164.908715297, -23.535671356, 158.184327716), x_dir=(0, 1, 0), z_dir=(0, 0, -1))) as fillet4_piece_5a_section:
        with BuildLine():
            CenterArc((FILLET4_R, FILLET4_R), FILLET4_R, 180, 90)
            Line((0, FILLET4_R), (-FILLET4_R * 0.02, FILLET4_R))
            Line((-FILLET4_R * 0.02, FILLET4_R), (-FILLET4_R * 0.02, -FILLET4_R * 0.02))
            Line((-FILLET4_R * 0.02, -FILLET4_R * 0.02), (FILLET4_R, -FILLET4_R * 0.02))
            Line((FILLET4_R, -FILLET4_R * 0.02), (FILLET4_R, 0))
        make_face()
    fillet4_piece_5a = extrude(amount=348.118655432, mode=Mode.PRIVATE)
    fillet4_piece_5a = split(fillet4_piece_5a, bisect_by=Plane(origin=(-164.908715297, -23.535671356, -158.184327716), z_dir=(0, 0, -1)), keep=Keep.TOP, mode=Mode.PRIVATE)
    with BuildSketch(Plane(origin=(-196.658715297, -23.535671356, -158.184327716), x_dir=(0, 1, 0), z_dir=(1, 0, 0))) as fillet4_piece_5b_section:
        with BuildLine():
            CenterArc((FILLET4_R, FILLET4_R), FILLET4_R, 180, 90)
            Line((0, FILLET4_R), (-FILLET4_R * 0.02, FILLET4_R))
            Line((-FILLET4_R * 0.02, FILLET4_R), (-FILLET4_R * 0.02, -FILLET4_R * 0.02))
            Line((-FILLET4_R * 0.02, -FILLET4_R * 0.02), (FILLET4_R, -FILLET4_R * 0.02))
            Line((FILLET4_R, -FILLET4_R * 0.02), (FILLET4_R, 0))
        make_face()
    fillet4_piece_5b = extrude(amount=183.767430594, mode=Mode.PRIVATE)
    fillet4_piece_5b = split(fillet4_piece_5b, bisect_by=Plane(origin=(-164.908715297, -23.535671356, -158.184327716), z_dir=(-1, 0, 0)), keep=Keep.TOP, mode=Mode.PRIVATE)
    fillet4_piece_5 = fillet4_piece_5a & fillet4_piece_5b
    add(fillet4_piece_5)

    # Fillet5
    fillet5_edges = [part.edges().sort_by_distance(p)[0] for p in [
        (-177.8, 32.344328644, 0),
    ]]
    fillet(fillet5_edges, radius=FILLET5_R)

    # Sketch12 → Boss-Extrude7 (add)
    with BuildSketch(Plane(origin=(0, 19.654209272, 0), x_dir=(1, 0, 0), z_dir=(0, 1, 0))):
        with Locations(Location((547.607631205, 0, 0), (0, 0, 90))):
            Circle(SKETCH12_R)
    extrude(amount=BOSS_EXTRUDE7_DEPTH)

    # Fillet6
    fillet6_edges = [part.edges().sort_by_distance(p)[0] for p in [
        (547.607631205, 45.054209272, 24.948838793),
    ]]
    fillet(fillet6_edges, radius=FILLET6_R)

    # Sketch13 → Boss-Extrude8 (add)
    with BuildSketch(Plane(origin=(0, 45.054209272, 0), x_dir=(1, 0, 0), z_dir=(0, 1, 0))):
        with Locations(Location((547.607631205, 0, 0), (0, 0, 270))):
            Circle(SKETCH13_R)
    extrude(amount=BOSS_EXTRUDE8_DEPTH)

    # Fillet7
    fillet7_edges = [part.edges().sort_by_distance(p)[0] for p in [
        (547.607631205, 57.754209272, -12.609032653),
    ]]
    fillet(fillet7_edges, radius=FILLET7_R)


solid = part.part
